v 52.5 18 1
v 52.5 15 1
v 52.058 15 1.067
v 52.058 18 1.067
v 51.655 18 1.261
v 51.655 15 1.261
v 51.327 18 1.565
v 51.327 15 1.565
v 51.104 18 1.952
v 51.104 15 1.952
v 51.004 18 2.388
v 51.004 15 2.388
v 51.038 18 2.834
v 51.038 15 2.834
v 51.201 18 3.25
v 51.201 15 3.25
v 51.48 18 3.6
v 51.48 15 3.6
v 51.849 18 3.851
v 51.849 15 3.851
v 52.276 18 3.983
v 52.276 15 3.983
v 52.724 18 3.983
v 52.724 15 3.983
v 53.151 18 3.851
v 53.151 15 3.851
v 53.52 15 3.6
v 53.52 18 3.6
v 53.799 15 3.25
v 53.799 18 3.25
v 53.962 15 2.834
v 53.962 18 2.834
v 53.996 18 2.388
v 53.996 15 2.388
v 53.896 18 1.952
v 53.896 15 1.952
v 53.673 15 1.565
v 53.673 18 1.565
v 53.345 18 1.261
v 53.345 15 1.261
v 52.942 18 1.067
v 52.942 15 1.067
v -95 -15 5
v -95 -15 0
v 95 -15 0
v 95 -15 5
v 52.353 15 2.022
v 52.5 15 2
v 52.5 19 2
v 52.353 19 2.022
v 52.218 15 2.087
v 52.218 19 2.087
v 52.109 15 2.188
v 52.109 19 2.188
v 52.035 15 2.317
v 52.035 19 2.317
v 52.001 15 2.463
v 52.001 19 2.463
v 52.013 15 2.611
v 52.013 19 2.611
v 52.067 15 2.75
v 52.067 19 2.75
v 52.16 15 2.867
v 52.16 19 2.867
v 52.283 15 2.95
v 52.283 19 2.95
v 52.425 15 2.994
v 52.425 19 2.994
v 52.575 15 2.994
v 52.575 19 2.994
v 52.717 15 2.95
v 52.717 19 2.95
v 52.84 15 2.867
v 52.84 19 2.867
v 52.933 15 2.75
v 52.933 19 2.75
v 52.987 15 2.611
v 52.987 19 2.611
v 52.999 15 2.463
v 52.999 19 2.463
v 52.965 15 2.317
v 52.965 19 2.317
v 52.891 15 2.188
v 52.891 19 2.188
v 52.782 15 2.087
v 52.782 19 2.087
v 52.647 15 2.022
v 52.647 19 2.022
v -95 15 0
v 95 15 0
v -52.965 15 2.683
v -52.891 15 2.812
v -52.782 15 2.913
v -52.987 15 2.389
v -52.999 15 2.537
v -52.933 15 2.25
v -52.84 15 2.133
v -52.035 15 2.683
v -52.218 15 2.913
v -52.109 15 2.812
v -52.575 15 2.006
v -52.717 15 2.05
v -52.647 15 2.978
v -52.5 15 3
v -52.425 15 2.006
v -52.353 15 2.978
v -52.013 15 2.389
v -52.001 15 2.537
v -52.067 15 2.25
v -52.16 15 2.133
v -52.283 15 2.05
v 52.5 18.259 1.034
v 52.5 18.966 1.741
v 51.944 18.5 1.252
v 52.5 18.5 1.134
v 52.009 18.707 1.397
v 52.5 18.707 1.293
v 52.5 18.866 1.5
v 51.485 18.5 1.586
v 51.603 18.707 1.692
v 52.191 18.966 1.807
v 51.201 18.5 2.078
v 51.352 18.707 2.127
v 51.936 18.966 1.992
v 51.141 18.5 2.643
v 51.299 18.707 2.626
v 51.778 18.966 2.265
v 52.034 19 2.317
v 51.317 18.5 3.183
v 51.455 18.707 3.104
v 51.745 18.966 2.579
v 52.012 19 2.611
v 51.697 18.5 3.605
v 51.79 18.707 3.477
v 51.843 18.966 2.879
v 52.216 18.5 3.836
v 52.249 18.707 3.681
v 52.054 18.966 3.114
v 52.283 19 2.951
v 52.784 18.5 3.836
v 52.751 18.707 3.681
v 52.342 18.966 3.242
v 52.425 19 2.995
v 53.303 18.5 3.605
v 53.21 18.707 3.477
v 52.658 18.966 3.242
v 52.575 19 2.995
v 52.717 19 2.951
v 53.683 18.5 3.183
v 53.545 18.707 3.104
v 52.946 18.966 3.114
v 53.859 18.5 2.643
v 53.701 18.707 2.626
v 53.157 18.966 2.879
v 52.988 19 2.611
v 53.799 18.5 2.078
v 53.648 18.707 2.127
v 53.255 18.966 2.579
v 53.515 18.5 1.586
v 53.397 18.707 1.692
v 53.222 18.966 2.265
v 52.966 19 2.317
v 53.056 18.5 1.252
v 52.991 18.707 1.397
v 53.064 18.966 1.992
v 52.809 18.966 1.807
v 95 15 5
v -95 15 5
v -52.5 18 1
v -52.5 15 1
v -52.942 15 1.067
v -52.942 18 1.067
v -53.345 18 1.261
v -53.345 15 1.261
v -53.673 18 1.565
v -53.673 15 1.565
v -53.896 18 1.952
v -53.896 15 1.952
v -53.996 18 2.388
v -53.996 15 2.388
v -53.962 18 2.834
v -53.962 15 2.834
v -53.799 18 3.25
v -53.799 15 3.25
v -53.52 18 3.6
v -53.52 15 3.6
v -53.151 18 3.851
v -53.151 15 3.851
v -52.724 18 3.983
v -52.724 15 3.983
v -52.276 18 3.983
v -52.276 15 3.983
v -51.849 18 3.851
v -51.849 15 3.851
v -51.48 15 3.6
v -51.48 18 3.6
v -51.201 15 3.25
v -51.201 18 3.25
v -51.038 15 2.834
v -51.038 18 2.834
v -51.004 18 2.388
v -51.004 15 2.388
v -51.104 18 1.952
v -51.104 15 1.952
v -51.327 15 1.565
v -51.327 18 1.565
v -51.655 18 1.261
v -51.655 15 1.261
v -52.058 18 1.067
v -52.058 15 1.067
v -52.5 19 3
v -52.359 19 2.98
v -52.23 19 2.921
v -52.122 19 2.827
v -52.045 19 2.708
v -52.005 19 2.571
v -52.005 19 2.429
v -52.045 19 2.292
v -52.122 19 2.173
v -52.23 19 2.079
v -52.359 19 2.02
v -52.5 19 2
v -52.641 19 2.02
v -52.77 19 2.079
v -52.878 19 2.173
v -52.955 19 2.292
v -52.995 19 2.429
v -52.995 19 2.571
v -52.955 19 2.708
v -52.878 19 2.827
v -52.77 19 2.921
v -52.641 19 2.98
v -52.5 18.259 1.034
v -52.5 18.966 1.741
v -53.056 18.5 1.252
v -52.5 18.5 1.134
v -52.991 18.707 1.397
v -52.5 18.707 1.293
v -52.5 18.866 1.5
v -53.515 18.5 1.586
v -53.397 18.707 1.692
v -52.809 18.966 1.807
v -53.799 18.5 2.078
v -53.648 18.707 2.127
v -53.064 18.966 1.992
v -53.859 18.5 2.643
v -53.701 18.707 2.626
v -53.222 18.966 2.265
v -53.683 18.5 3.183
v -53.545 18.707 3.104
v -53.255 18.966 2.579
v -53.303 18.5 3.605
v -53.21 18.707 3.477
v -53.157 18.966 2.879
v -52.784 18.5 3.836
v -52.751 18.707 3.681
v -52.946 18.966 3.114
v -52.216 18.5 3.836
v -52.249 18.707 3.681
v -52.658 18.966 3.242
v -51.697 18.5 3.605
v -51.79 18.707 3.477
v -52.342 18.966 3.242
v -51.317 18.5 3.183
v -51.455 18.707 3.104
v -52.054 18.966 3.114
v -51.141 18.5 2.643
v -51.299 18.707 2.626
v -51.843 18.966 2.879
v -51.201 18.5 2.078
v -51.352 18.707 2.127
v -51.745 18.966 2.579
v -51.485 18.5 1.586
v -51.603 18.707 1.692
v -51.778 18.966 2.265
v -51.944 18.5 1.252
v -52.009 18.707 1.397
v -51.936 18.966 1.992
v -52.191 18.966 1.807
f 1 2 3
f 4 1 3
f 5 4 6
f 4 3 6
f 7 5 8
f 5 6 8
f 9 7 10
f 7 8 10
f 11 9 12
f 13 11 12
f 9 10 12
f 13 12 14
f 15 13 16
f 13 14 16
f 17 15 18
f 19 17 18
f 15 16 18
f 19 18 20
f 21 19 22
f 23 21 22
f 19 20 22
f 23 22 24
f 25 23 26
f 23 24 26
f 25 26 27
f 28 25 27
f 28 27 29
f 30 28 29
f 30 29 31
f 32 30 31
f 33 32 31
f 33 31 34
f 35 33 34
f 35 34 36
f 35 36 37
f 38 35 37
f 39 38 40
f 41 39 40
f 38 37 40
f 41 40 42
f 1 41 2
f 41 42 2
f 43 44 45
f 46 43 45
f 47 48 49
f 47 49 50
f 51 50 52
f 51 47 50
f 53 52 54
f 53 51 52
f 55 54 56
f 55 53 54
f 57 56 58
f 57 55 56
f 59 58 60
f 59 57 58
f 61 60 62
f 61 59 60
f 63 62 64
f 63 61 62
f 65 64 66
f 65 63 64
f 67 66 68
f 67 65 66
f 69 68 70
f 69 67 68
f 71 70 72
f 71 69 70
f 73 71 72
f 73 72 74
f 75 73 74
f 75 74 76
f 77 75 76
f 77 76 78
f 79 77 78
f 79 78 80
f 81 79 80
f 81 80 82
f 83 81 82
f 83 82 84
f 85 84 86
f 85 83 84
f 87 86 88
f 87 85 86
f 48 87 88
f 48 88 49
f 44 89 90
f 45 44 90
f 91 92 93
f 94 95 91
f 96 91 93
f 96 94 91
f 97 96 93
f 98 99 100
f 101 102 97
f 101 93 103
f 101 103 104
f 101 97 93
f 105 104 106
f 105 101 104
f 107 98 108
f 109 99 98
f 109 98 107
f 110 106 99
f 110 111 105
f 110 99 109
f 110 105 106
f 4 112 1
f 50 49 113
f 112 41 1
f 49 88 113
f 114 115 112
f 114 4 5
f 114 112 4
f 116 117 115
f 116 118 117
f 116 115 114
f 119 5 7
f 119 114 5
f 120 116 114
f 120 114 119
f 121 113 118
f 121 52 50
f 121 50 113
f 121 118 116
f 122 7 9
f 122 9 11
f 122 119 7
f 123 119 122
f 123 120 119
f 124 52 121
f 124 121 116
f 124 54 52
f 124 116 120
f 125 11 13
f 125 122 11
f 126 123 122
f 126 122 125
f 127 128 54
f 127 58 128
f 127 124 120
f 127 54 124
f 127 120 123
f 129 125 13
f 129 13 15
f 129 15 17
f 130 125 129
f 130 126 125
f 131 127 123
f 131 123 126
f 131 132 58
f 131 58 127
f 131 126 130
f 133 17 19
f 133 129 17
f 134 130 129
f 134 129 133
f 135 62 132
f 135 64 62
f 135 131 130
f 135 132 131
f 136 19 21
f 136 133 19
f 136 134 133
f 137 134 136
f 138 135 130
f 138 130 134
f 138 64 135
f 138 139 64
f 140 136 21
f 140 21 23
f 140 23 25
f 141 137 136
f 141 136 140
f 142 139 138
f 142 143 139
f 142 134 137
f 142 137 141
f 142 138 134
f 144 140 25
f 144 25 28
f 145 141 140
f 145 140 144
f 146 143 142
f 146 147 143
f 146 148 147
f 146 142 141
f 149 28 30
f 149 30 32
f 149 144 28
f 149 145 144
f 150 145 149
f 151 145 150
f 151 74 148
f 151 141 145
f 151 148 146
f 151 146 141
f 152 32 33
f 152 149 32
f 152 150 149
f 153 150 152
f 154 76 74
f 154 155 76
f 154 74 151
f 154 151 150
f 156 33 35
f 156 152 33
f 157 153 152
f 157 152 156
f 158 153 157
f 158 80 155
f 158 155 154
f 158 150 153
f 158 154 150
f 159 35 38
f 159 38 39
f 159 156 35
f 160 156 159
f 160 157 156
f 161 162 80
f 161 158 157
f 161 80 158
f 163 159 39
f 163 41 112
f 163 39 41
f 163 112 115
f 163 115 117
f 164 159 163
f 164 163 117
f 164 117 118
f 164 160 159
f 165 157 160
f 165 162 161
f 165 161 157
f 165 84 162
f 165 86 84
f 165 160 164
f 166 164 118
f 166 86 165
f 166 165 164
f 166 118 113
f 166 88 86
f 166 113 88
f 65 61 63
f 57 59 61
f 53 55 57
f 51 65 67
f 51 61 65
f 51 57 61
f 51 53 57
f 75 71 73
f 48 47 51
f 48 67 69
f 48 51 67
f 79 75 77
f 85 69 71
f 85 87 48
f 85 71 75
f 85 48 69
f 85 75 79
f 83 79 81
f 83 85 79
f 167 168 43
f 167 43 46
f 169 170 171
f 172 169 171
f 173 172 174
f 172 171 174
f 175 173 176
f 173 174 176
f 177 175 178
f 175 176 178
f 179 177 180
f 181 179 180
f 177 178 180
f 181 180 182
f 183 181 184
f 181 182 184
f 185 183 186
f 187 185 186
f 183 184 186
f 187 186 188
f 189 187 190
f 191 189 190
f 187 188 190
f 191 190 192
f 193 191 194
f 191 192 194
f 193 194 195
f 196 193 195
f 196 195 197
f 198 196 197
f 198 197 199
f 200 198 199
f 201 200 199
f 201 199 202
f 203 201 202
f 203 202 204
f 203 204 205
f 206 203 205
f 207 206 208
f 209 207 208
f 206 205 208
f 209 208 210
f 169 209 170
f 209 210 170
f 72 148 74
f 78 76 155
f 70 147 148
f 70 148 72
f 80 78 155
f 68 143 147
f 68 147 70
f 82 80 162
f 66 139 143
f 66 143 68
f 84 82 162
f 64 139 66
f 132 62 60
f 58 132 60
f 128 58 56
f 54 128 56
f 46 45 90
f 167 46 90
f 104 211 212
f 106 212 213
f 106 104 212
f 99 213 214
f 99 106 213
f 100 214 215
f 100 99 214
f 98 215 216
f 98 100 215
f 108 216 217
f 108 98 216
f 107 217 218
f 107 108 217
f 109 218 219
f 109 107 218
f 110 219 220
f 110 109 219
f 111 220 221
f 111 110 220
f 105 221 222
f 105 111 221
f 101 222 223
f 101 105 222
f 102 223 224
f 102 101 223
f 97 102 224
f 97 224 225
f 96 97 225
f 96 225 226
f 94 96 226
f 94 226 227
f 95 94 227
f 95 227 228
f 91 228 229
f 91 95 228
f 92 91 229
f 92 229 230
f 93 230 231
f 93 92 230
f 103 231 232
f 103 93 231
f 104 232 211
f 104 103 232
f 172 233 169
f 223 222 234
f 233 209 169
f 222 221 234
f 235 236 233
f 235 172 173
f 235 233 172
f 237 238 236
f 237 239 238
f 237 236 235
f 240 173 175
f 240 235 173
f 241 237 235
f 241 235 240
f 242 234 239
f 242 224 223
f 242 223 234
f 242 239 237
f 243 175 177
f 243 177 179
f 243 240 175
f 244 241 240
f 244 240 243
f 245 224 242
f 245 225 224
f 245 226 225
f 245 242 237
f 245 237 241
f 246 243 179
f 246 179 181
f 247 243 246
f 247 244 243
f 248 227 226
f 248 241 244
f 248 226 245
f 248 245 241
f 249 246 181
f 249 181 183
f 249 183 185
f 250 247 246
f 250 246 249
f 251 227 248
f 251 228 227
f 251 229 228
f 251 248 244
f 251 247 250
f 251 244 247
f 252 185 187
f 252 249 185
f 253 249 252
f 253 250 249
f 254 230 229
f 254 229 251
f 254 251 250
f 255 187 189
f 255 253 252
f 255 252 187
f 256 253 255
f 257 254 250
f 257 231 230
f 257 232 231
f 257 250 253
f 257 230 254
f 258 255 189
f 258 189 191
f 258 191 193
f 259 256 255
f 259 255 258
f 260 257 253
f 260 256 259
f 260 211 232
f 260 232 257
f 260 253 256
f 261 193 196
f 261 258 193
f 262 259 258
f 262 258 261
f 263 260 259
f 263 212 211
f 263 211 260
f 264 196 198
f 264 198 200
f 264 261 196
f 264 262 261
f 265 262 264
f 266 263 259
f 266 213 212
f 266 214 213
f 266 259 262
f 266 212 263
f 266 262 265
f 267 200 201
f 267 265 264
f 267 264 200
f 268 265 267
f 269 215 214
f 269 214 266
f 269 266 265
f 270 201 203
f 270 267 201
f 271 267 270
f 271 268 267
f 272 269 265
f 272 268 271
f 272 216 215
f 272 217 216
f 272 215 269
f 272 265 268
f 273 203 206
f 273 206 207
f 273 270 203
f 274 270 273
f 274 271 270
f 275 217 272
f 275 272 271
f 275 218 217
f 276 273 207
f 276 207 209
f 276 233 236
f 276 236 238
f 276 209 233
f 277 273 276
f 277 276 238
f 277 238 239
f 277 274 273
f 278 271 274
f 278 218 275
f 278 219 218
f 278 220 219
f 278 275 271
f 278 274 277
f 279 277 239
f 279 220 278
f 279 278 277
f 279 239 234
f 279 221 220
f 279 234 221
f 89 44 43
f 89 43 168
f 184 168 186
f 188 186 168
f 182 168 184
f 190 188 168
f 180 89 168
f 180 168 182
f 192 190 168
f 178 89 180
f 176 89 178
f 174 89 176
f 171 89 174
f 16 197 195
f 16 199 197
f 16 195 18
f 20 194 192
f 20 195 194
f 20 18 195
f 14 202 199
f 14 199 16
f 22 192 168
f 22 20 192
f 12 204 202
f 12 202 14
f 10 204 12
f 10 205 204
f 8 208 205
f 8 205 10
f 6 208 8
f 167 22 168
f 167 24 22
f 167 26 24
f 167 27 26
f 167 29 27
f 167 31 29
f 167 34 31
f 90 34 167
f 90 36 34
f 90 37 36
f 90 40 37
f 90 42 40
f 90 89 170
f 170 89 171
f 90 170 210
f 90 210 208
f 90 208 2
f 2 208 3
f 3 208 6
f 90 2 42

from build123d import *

# Parameters (mm, degrees)
ESQUISSE1_W        = 190
ESQUISSE1_H        = 30
BOSS_EXTRU_1_DEPTH = 5
ESQUISSE2_R        = 1.5
ESQUISSE2_R_2      = 0.5
BOSS_EXTRU_2_DEPTH = 4
CONG_1_R           = 1


with BuildPart() as part:
    # Esquisse1 → Boss.-Extru.1 (new body)
    with BuildSketch(Plane.XY):
        Rectangle(ESQUISSE1_W, ESQUISSE1_H)
    extrude(amount=BOSS_EXTRU_1_DEPTH)

    # Esquisse2 → Boss.-Extru.2 (add)
    # profile 1 of 2: a face of its own
    with BuildSketch(Plane(origin=(0, 15, 0), x_dir=(1, 0, 0), z_dir=(0, 1, 0))):
        with Locations(Location((-52.5, -2.5, 0), (0, 0, 90))):
            Circle(ESQUISSE2_R)
        with Locations(Location((-52.5, -2.5, 0), (0, 0, 270))):
            Circle(ESQUISSE2_R_2, mode=Mode.SUBTRACT)
    # profile 2 of 2: a face of its own
    with BuildSketch(Plane(origin=(0, 15, 0), x_dir=(1, 0, 0), z_dir=(0, 1, 0))):
        with Locations(Location((52.5, -2.5, 0), (0, 0, 90))):
            Circle(ESQUISSE2_R)
        with Locations(Location((52.5, -2.5, 0), (0, 0, 90))):
            Circle(ESQUISSE2_R_2, mode=Mode.SUBTRACT)
    extrude(amount=BOSS_EXTRU_2_DEPTH)

    # Congé1
    cong_1_edges = [part.edges().sort_by_distance(p)[0] for p in [
        (-52.5, 19, 4),
        (52.5, 19, 4),
    ]]
    fillet(cong_1_edges, radius=CONG_1_R - 0.0001)  # a hair under: the kernel refuses the full size


solid = part.part
